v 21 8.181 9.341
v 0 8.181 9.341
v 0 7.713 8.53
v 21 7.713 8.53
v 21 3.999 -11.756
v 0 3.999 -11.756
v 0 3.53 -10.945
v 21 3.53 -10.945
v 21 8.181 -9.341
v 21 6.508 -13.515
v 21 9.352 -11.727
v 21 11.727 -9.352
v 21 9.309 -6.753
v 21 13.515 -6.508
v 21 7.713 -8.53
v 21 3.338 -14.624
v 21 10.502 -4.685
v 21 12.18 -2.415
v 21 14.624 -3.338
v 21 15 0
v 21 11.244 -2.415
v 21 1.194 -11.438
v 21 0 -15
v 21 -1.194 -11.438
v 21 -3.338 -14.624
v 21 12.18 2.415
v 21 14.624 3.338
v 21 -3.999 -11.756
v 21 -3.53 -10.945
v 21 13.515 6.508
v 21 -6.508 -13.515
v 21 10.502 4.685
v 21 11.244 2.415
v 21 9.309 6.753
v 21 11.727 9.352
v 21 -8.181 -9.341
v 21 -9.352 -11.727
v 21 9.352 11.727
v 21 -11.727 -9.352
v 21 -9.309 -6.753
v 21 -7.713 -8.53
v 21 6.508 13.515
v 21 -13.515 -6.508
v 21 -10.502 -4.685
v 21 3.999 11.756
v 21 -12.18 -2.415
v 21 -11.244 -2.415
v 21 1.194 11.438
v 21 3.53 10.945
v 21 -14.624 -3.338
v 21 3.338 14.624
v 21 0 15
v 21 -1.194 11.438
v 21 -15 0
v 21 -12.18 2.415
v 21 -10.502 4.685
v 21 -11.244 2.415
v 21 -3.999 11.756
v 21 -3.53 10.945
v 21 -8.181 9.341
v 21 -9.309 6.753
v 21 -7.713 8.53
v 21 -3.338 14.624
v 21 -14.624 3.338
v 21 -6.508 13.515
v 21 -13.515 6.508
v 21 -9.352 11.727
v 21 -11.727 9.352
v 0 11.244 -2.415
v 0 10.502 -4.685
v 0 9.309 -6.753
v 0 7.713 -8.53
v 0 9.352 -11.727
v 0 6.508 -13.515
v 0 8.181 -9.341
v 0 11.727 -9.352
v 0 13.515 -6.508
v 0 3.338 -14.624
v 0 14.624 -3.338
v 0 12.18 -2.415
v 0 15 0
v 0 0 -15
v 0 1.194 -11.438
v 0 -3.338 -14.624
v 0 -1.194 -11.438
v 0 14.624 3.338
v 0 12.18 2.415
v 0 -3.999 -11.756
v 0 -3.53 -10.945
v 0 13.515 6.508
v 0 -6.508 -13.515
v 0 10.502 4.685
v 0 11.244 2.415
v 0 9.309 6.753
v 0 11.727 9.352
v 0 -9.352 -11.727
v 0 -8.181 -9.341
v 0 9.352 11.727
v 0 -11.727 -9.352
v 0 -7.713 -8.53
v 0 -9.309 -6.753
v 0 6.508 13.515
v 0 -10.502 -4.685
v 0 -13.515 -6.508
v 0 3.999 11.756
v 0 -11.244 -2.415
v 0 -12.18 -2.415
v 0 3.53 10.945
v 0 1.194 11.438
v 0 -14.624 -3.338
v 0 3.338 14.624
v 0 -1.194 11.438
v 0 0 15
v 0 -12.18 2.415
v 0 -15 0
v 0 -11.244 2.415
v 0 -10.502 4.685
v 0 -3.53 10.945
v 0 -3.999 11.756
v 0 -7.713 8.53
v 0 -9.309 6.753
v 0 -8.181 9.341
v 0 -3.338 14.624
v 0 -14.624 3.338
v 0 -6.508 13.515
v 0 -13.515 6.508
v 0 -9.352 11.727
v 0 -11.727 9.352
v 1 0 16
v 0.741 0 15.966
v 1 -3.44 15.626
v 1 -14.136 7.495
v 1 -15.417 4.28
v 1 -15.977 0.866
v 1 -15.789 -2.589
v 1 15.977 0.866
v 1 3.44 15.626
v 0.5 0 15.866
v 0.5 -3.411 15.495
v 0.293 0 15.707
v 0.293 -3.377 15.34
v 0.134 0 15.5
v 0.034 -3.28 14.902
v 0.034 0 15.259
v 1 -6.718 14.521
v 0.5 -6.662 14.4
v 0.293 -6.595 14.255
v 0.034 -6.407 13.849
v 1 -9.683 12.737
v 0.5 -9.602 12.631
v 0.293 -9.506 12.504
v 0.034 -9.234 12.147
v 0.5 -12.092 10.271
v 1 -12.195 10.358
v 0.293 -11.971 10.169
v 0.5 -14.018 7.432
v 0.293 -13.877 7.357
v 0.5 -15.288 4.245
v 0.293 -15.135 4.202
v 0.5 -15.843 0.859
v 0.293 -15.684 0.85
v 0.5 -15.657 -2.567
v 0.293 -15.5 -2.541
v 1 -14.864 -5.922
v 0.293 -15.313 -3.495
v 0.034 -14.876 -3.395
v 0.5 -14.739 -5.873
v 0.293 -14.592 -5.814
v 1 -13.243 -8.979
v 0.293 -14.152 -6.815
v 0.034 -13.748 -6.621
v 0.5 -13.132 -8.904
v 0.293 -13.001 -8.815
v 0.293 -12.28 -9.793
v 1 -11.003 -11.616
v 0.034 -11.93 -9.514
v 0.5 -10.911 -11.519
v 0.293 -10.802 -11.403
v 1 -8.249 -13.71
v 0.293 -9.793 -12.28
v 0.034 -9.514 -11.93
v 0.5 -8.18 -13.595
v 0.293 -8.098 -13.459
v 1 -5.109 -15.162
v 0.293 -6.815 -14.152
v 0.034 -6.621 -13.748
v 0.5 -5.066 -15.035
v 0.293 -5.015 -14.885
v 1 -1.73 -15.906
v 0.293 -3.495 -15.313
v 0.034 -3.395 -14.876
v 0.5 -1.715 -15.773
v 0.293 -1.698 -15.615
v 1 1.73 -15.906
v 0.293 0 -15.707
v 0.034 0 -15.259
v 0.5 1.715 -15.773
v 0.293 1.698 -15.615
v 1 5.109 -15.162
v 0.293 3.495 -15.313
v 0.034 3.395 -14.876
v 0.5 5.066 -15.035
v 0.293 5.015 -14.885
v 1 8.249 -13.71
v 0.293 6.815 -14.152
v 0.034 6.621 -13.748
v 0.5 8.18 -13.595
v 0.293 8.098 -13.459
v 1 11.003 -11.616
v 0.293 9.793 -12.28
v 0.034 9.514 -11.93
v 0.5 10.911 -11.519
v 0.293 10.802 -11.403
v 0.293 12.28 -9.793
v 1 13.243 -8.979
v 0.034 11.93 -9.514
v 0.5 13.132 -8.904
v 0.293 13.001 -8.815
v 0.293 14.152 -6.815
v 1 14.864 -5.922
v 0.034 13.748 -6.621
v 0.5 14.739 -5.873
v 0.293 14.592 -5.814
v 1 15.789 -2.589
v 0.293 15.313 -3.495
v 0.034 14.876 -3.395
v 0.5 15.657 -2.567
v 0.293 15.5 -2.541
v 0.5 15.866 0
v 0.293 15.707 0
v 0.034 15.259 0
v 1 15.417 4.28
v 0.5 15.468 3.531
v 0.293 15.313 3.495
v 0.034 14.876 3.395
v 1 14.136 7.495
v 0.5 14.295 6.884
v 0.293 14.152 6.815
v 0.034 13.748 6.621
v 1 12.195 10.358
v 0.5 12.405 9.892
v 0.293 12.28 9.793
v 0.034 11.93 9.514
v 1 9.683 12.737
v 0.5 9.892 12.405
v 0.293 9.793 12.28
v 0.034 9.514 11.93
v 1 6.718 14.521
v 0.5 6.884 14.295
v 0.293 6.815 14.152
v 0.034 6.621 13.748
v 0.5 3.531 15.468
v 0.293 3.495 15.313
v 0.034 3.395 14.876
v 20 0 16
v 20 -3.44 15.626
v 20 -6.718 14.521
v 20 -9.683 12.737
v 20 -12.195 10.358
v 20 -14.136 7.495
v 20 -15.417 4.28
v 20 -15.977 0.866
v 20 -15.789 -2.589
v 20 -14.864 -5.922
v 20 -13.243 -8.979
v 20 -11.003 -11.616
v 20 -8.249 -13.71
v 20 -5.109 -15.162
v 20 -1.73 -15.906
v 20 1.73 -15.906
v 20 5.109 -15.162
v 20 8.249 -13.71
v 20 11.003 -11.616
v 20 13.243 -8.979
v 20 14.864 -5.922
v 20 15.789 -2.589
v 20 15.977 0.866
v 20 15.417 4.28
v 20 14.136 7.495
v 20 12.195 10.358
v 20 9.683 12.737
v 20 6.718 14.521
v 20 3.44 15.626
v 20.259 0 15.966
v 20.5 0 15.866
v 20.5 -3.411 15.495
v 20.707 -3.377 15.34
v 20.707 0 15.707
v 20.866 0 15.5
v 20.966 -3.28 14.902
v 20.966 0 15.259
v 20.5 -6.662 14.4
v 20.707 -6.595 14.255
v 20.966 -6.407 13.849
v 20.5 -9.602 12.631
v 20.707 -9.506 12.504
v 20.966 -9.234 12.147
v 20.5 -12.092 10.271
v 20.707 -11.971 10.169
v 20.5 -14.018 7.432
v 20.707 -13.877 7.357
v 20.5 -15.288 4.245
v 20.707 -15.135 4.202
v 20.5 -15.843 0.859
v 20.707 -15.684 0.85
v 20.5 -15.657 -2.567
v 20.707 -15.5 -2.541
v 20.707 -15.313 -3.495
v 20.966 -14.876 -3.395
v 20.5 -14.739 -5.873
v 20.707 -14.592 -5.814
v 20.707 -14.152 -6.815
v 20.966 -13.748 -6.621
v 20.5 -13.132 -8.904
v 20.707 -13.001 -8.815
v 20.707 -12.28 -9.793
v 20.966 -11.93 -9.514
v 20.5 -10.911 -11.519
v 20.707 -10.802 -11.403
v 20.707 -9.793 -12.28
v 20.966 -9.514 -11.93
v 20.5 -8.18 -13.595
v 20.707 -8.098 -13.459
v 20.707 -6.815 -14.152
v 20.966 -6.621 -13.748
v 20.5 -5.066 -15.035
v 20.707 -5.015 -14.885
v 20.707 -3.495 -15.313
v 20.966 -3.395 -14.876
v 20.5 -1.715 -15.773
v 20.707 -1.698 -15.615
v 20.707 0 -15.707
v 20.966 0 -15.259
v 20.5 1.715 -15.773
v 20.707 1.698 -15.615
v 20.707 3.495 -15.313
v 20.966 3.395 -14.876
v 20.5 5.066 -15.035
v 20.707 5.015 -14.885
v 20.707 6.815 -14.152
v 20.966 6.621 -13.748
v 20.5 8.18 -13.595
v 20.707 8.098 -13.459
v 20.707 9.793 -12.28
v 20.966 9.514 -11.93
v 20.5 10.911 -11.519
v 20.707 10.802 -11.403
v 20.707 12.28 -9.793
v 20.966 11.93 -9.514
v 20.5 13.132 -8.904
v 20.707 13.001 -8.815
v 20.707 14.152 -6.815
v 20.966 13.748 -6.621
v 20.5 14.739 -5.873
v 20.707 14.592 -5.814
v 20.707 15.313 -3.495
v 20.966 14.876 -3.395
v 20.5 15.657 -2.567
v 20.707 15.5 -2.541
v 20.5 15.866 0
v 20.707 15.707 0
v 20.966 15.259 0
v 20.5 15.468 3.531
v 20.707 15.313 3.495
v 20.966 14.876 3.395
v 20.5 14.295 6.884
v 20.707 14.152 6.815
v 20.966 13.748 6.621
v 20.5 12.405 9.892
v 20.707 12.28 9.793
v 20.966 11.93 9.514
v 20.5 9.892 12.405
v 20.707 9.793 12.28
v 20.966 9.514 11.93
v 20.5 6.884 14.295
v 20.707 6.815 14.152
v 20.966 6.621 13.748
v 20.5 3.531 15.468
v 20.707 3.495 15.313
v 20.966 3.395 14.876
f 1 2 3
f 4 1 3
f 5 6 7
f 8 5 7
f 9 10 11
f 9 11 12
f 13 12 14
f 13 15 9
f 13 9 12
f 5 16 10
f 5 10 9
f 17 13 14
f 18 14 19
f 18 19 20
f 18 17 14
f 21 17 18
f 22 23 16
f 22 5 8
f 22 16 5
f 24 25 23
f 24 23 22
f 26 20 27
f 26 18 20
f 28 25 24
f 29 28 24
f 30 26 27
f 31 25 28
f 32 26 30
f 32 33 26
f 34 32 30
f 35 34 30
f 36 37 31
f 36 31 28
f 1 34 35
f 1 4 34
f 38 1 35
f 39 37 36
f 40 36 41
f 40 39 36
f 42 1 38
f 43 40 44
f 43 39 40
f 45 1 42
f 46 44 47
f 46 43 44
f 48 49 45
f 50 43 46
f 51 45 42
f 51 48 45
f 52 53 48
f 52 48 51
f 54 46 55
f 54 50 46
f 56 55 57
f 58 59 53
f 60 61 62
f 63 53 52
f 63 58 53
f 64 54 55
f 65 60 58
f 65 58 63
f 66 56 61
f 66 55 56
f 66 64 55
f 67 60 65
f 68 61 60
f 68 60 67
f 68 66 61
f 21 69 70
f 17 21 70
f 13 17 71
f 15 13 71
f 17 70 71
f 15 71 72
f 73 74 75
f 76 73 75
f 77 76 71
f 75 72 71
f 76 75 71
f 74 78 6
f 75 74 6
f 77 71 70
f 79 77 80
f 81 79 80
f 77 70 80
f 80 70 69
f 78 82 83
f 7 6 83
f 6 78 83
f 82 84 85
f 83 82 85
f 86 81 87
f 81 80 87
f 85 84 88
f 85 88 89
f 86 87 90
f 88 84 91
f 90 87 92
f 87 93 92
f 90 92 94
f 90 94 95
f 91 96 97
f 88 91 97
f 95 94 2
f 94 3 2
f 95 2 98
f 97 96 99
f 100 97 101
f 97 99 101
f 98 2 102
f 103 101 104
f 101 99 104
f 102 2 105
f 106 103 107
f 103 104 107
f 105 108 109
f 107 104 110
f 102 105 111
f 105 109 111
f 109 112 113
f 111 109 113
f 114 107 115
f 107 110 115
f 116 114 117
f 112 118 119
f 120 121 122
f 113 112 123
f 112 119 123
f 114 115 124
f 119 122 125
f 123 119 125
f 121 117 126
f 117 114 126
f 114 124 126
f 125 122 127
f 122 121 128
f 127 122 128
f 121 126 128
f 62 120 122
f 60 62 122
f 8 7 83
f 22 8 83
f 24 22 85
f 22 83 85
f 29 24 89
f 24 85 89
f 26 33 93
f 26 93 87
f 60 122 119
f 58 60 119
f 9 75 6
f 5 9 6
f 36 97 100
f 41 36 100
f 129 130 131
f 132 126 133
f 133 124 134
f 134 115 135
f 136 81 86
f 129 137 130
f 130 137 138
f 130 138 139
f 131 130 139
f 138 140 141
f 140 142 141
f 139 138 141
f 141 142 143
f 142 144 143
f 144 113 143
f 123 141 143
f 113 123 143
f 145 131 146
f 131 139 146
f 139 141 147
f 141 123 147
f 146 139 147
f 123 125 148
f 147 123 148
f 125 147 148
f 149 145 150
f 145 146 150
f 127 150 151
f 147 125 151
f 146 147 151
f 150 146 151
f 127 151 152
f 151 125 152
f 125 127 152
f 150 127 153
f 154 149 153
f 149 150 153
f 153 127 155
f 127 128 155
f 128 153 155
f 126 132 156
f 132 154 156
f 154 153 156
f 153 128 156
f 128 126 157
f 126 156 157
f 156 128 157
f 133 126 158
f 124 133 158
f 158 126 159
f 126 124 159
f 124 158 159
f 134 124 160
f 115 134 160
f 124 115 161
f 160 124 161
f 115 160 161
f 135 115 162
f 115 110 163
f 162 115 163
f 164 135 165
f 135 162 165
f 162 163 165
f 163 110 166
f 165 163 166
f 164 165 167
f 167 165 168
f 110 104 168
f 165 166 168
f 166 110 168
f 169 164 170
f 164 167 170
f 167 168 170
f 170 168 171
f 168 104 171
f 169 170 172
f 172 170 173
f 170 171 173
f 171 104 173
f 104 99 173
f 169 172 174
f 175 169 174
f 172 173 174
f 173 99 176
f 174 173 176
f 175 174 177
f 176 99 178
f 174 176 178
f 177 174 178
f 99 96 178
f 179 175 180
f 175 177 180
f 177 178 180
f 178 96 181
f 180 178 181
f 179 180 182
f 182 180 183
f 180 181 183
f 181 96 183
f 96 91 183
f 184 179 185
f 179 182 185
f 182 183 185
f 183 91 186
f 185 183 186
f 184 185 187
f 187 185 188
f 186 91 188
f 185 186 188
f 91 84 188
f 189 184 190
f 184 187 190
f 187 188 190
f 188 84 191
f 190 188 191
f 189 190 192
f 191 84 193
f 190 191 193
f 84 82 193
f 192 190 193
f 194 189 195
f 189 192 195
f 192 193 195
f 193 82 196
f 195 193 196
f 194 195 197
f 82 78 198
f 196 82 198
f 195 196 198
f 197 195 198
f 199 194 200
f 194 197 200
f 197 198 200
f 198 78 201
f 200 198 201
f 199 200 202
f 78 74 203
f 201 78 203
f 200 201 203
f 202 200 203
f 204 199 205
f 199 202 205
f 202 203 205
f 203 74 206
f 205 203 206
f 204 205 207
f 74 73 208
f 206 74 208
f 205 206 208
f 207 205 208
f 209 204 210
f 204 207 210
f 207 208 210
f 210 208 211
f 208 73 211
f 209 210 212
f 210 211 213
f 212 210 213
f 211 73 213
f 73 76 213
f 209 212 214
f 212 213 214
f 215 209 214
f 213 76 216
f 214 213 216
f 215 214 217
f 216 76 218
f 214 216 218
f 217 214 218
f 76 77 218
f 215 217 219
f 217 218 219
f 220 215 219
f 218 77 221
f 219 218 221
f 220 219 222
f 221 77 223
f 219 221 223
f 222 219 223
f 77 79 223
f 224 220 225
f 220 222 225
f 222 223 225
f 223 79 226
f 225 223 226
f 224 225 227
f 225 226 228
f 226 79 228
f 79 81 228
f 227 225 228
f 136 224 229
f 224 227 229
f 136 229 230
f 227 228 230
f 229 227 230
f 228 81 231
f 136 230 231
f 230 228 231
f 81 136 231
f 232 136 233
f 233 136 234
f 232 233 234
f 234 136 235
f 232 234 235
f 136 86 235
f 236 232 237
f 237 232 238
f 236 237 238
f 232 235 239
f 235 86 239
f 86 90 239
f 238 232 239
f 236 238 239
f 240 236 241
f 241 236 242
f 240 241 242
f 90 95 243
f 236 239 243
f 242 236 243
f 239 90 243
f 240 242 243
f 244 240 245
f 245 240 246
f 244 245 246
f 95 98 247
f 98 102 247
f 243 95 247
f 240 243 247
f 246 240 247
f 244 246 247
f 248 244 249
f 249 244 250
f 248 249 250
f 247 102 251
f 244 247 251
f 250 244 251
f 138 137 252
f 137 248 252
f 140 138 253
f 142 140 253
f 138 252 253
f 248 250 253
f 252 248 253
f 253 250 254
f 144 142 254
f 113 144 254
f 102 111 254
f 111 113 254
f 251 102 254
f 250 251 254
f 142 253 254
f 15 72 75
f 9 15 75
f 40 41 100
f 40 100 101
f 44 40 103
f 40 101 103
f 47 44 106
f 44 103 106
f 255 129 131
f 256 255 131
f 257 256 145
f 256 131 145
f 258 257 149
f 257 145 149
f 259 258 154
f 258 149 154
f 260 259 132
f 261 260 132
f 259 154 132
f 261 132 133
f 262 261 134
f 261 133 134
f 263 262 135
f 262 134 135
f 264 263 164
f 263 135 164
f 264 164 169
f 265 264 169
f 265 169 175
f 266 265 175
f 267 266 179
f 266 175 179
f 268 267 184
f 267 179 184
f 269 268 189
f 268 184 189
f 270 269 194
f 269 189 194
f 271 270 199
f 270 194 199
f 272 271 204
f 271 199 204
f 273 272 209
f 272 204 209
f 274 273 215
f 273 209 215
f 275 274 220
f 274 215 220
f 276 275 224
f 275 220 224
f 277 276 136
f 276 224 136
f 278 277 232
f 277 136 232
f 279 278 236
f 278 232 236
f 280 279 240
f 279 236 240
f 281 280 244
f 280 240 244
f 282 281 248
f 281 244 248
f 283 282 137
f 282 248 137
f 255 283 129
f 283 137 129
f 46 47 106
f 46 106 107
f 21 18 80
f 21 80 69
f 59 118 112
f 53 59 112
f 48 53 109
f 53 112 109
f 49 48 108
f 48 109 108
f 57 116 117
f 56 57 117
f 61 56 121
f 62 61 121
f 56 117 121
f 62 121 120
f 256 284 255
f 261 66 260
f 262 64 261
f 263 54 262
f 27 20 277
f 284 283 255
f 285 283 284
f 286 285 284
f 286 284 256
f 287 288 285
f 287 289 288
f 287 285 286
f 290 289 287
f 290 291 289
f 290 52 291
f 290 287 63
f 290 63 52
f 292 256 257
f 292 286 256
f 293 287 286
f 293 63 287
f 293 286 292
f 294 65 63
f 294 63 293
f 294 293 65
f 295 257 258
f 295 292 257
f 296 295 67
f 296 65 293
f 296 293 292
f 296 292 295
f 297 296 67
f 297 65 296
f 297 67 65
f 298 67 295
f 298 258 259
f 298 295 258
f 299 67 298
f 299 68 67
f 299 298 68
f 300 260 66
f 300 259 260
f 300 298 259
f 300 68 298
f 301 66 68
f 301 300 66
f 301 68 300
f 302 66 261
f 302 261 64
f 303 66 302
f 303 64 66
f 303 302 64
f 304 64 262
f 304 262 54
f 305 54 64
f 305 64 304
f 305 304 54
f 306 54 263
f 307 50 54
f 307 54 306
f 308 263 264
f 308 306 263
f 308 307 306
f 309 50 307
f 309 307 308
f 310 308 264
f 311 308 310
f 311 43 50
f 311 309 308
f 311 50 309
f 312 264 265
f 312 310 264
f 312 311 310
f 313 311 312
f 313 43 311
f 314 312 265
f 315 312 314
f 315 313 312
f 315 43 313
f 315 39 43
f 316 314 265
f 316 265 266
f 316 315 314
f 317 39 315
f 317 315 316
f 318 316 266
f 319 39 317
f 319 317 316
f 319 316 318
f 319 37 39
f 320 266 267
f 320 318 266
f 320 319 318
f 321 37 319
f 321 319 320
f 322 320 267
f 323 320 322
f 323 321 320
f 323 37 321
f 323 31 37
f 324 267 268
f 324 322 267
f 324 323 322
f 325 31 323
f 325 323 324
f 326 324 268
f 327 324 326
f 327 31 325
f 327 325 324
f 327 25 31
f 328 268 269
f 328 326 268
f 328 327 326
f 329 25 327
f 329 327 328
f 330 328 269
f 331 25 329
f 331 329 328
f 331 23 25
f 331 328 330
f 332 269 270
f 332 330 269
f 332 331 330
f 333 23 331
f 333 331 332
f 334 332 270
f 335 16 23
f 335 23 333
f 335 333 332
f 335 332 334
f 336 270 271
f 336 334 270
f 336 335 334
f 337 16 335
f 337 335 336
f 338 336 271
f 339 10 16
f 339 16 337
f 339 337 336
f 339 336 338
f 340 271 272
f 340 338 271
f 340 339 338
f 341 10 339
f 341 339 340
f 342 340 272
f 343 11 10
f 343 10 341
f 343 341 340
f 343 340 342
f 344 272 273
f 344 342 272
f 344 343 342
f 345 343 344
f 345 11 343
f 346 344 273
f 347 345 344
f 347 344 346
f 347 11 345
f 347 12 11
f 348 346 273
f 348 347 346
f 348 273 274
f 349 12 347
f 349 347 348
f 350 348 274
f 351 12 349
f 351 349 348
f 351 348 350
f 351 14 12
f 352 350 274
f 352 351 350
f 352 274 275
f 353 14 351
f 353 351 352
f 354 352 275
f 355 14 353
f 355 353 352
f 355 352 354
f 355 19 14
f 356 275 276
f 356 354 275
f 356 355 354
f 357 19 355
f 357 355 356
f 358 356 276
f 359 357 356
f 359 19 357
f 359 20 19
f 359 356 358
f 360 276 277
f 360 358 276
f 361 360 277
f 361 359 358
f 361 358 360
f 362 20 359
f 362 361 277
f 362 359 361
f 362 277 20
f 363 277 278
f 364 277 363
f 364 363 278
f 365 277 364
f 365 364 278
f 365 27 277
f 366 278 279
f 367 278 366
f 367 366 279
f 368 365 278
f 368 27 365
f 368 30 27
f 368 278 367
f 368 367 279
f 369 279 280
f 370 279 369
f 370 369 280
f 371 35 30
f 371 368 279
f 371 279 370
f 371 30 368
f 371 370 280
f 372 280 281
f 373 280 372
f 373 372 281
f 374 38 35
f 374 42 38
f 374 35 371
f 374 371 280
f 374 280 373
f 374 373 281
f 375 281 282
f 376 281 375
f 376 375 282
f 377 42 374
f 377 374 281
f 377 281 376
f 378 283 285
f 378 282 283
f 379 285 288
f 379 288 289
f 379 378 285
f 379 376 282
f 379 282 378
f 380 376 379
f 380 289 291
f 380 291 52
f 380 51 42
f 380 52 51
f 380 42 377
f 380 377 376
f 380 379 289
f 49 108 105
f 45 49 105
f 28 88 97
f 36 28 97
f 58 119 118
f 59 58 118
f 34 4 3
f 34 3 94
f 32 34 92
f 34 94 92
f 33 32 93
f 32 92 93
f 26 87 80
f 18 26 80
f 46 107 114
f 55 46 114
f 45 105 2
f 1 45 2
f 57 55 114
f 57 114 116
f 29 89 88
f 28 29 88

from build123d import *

# Parameters (mm, degrees)
CROQUIS1_R              = 16
SALIENTE_EXTRUIR1_DEPTH = 21
REDONDEO1_R             = 1


with BuildPart() as part:
    # Croquis1 → Saliente-Extruir1 (new body)
    with BuildSketch(Plane(origin=(0, 0, 0), x_dir=(0, 0, -1), z_dir=(1, 0, 0))):
        with Locations(Location((0, 0, 0), (0, 0, 180))):
            Circle(CROQUIS1_R)
        with BuildLine():
            Line((9.340689418, 8.18145135), (11.755689418, 3.99854865))
            Line((11.755689418, 3.99854865), (10.944713731, 3.530331619))
            ThreePointArc((10.944713731, 3.530331619), (11.5, 0), (10.944713731, -3.530331619))
            Line((10.944713731, -3.530331619), (11.755689418, -3.99854865))
            Line((11.755689418, -3.99854865), (9.340689418, -8.18145135))
            Line((9.340689418, -8.18145135), (8.529713731, -7.713234319))
            ThreePointArc((8.529713731, -7.713234319), (5.75, -9.959292144), (2.415, -11.243565938))
            Line((2.415, -11.243565938), (2.415, -12.18))
            Line((2.415, -12.18), (-2.415, -12.18))
            Line((-2.415, -12.18), (-2.415, -11.243565938))
            ThreePointArc((-2.415, -11.243565938), (-5.75, -9.959292144), (-8.529713731, -7.713234319))
            Line((-8.529713731, -7.713234319), (-9.340689418, -8.18145135))
            Line((-9.340689418, -8.18145135), (-11.755689418, -3.99854865))
            Line((-11.755689418, -3.99854865), (-10.944713731, -3.530331619))
            ThreePointArc((-10.944713731, -3.530331619), (-11.5, 0), (-10.944713731, 3.530331619))
            Line((-10.944713731, 3.530331619), (-11.755689418, 3.99854865))
            Line((-11.755689418, 3.99854865), (-9.340689418, 8.18145135))
            Line((-9.340689418, 8.18145135), (-8.529713731, 7.713234319))
            ThreePointArc((-8.529713731, 7.713234319), (-5.75, 9.959292144), (-2.415, 11.243565938))
            Line((-2.415, 11.243565938), (-2.415, 12.18))
            Line((-2.415, 12.18), (2.415, 12.18))
            Line((2.415, 12.18), (2.415, 11.243565938))
            ThreePointArc((2.415, 11.243565938), (5.75, 9.959292144), (8.529713731, 7.713234319))
            Line((8.529713731, 7.713234319), (9.340689418, 8.18145135))
        make_face(mode=Mode.SUBTRACT)
    extrude(amount=SALIENTE_EXTRUIR1_DEPTH)

    # Redondeo1
    redondeo1_edges = [part.edges().sort_by_distance(p)[0] for p in [
        (0, 0, -16),
        (21, 0, -16),
    ]]
    fillet(redondeo1_edges, radius=REDONDEO1_R)


solid = part.part
